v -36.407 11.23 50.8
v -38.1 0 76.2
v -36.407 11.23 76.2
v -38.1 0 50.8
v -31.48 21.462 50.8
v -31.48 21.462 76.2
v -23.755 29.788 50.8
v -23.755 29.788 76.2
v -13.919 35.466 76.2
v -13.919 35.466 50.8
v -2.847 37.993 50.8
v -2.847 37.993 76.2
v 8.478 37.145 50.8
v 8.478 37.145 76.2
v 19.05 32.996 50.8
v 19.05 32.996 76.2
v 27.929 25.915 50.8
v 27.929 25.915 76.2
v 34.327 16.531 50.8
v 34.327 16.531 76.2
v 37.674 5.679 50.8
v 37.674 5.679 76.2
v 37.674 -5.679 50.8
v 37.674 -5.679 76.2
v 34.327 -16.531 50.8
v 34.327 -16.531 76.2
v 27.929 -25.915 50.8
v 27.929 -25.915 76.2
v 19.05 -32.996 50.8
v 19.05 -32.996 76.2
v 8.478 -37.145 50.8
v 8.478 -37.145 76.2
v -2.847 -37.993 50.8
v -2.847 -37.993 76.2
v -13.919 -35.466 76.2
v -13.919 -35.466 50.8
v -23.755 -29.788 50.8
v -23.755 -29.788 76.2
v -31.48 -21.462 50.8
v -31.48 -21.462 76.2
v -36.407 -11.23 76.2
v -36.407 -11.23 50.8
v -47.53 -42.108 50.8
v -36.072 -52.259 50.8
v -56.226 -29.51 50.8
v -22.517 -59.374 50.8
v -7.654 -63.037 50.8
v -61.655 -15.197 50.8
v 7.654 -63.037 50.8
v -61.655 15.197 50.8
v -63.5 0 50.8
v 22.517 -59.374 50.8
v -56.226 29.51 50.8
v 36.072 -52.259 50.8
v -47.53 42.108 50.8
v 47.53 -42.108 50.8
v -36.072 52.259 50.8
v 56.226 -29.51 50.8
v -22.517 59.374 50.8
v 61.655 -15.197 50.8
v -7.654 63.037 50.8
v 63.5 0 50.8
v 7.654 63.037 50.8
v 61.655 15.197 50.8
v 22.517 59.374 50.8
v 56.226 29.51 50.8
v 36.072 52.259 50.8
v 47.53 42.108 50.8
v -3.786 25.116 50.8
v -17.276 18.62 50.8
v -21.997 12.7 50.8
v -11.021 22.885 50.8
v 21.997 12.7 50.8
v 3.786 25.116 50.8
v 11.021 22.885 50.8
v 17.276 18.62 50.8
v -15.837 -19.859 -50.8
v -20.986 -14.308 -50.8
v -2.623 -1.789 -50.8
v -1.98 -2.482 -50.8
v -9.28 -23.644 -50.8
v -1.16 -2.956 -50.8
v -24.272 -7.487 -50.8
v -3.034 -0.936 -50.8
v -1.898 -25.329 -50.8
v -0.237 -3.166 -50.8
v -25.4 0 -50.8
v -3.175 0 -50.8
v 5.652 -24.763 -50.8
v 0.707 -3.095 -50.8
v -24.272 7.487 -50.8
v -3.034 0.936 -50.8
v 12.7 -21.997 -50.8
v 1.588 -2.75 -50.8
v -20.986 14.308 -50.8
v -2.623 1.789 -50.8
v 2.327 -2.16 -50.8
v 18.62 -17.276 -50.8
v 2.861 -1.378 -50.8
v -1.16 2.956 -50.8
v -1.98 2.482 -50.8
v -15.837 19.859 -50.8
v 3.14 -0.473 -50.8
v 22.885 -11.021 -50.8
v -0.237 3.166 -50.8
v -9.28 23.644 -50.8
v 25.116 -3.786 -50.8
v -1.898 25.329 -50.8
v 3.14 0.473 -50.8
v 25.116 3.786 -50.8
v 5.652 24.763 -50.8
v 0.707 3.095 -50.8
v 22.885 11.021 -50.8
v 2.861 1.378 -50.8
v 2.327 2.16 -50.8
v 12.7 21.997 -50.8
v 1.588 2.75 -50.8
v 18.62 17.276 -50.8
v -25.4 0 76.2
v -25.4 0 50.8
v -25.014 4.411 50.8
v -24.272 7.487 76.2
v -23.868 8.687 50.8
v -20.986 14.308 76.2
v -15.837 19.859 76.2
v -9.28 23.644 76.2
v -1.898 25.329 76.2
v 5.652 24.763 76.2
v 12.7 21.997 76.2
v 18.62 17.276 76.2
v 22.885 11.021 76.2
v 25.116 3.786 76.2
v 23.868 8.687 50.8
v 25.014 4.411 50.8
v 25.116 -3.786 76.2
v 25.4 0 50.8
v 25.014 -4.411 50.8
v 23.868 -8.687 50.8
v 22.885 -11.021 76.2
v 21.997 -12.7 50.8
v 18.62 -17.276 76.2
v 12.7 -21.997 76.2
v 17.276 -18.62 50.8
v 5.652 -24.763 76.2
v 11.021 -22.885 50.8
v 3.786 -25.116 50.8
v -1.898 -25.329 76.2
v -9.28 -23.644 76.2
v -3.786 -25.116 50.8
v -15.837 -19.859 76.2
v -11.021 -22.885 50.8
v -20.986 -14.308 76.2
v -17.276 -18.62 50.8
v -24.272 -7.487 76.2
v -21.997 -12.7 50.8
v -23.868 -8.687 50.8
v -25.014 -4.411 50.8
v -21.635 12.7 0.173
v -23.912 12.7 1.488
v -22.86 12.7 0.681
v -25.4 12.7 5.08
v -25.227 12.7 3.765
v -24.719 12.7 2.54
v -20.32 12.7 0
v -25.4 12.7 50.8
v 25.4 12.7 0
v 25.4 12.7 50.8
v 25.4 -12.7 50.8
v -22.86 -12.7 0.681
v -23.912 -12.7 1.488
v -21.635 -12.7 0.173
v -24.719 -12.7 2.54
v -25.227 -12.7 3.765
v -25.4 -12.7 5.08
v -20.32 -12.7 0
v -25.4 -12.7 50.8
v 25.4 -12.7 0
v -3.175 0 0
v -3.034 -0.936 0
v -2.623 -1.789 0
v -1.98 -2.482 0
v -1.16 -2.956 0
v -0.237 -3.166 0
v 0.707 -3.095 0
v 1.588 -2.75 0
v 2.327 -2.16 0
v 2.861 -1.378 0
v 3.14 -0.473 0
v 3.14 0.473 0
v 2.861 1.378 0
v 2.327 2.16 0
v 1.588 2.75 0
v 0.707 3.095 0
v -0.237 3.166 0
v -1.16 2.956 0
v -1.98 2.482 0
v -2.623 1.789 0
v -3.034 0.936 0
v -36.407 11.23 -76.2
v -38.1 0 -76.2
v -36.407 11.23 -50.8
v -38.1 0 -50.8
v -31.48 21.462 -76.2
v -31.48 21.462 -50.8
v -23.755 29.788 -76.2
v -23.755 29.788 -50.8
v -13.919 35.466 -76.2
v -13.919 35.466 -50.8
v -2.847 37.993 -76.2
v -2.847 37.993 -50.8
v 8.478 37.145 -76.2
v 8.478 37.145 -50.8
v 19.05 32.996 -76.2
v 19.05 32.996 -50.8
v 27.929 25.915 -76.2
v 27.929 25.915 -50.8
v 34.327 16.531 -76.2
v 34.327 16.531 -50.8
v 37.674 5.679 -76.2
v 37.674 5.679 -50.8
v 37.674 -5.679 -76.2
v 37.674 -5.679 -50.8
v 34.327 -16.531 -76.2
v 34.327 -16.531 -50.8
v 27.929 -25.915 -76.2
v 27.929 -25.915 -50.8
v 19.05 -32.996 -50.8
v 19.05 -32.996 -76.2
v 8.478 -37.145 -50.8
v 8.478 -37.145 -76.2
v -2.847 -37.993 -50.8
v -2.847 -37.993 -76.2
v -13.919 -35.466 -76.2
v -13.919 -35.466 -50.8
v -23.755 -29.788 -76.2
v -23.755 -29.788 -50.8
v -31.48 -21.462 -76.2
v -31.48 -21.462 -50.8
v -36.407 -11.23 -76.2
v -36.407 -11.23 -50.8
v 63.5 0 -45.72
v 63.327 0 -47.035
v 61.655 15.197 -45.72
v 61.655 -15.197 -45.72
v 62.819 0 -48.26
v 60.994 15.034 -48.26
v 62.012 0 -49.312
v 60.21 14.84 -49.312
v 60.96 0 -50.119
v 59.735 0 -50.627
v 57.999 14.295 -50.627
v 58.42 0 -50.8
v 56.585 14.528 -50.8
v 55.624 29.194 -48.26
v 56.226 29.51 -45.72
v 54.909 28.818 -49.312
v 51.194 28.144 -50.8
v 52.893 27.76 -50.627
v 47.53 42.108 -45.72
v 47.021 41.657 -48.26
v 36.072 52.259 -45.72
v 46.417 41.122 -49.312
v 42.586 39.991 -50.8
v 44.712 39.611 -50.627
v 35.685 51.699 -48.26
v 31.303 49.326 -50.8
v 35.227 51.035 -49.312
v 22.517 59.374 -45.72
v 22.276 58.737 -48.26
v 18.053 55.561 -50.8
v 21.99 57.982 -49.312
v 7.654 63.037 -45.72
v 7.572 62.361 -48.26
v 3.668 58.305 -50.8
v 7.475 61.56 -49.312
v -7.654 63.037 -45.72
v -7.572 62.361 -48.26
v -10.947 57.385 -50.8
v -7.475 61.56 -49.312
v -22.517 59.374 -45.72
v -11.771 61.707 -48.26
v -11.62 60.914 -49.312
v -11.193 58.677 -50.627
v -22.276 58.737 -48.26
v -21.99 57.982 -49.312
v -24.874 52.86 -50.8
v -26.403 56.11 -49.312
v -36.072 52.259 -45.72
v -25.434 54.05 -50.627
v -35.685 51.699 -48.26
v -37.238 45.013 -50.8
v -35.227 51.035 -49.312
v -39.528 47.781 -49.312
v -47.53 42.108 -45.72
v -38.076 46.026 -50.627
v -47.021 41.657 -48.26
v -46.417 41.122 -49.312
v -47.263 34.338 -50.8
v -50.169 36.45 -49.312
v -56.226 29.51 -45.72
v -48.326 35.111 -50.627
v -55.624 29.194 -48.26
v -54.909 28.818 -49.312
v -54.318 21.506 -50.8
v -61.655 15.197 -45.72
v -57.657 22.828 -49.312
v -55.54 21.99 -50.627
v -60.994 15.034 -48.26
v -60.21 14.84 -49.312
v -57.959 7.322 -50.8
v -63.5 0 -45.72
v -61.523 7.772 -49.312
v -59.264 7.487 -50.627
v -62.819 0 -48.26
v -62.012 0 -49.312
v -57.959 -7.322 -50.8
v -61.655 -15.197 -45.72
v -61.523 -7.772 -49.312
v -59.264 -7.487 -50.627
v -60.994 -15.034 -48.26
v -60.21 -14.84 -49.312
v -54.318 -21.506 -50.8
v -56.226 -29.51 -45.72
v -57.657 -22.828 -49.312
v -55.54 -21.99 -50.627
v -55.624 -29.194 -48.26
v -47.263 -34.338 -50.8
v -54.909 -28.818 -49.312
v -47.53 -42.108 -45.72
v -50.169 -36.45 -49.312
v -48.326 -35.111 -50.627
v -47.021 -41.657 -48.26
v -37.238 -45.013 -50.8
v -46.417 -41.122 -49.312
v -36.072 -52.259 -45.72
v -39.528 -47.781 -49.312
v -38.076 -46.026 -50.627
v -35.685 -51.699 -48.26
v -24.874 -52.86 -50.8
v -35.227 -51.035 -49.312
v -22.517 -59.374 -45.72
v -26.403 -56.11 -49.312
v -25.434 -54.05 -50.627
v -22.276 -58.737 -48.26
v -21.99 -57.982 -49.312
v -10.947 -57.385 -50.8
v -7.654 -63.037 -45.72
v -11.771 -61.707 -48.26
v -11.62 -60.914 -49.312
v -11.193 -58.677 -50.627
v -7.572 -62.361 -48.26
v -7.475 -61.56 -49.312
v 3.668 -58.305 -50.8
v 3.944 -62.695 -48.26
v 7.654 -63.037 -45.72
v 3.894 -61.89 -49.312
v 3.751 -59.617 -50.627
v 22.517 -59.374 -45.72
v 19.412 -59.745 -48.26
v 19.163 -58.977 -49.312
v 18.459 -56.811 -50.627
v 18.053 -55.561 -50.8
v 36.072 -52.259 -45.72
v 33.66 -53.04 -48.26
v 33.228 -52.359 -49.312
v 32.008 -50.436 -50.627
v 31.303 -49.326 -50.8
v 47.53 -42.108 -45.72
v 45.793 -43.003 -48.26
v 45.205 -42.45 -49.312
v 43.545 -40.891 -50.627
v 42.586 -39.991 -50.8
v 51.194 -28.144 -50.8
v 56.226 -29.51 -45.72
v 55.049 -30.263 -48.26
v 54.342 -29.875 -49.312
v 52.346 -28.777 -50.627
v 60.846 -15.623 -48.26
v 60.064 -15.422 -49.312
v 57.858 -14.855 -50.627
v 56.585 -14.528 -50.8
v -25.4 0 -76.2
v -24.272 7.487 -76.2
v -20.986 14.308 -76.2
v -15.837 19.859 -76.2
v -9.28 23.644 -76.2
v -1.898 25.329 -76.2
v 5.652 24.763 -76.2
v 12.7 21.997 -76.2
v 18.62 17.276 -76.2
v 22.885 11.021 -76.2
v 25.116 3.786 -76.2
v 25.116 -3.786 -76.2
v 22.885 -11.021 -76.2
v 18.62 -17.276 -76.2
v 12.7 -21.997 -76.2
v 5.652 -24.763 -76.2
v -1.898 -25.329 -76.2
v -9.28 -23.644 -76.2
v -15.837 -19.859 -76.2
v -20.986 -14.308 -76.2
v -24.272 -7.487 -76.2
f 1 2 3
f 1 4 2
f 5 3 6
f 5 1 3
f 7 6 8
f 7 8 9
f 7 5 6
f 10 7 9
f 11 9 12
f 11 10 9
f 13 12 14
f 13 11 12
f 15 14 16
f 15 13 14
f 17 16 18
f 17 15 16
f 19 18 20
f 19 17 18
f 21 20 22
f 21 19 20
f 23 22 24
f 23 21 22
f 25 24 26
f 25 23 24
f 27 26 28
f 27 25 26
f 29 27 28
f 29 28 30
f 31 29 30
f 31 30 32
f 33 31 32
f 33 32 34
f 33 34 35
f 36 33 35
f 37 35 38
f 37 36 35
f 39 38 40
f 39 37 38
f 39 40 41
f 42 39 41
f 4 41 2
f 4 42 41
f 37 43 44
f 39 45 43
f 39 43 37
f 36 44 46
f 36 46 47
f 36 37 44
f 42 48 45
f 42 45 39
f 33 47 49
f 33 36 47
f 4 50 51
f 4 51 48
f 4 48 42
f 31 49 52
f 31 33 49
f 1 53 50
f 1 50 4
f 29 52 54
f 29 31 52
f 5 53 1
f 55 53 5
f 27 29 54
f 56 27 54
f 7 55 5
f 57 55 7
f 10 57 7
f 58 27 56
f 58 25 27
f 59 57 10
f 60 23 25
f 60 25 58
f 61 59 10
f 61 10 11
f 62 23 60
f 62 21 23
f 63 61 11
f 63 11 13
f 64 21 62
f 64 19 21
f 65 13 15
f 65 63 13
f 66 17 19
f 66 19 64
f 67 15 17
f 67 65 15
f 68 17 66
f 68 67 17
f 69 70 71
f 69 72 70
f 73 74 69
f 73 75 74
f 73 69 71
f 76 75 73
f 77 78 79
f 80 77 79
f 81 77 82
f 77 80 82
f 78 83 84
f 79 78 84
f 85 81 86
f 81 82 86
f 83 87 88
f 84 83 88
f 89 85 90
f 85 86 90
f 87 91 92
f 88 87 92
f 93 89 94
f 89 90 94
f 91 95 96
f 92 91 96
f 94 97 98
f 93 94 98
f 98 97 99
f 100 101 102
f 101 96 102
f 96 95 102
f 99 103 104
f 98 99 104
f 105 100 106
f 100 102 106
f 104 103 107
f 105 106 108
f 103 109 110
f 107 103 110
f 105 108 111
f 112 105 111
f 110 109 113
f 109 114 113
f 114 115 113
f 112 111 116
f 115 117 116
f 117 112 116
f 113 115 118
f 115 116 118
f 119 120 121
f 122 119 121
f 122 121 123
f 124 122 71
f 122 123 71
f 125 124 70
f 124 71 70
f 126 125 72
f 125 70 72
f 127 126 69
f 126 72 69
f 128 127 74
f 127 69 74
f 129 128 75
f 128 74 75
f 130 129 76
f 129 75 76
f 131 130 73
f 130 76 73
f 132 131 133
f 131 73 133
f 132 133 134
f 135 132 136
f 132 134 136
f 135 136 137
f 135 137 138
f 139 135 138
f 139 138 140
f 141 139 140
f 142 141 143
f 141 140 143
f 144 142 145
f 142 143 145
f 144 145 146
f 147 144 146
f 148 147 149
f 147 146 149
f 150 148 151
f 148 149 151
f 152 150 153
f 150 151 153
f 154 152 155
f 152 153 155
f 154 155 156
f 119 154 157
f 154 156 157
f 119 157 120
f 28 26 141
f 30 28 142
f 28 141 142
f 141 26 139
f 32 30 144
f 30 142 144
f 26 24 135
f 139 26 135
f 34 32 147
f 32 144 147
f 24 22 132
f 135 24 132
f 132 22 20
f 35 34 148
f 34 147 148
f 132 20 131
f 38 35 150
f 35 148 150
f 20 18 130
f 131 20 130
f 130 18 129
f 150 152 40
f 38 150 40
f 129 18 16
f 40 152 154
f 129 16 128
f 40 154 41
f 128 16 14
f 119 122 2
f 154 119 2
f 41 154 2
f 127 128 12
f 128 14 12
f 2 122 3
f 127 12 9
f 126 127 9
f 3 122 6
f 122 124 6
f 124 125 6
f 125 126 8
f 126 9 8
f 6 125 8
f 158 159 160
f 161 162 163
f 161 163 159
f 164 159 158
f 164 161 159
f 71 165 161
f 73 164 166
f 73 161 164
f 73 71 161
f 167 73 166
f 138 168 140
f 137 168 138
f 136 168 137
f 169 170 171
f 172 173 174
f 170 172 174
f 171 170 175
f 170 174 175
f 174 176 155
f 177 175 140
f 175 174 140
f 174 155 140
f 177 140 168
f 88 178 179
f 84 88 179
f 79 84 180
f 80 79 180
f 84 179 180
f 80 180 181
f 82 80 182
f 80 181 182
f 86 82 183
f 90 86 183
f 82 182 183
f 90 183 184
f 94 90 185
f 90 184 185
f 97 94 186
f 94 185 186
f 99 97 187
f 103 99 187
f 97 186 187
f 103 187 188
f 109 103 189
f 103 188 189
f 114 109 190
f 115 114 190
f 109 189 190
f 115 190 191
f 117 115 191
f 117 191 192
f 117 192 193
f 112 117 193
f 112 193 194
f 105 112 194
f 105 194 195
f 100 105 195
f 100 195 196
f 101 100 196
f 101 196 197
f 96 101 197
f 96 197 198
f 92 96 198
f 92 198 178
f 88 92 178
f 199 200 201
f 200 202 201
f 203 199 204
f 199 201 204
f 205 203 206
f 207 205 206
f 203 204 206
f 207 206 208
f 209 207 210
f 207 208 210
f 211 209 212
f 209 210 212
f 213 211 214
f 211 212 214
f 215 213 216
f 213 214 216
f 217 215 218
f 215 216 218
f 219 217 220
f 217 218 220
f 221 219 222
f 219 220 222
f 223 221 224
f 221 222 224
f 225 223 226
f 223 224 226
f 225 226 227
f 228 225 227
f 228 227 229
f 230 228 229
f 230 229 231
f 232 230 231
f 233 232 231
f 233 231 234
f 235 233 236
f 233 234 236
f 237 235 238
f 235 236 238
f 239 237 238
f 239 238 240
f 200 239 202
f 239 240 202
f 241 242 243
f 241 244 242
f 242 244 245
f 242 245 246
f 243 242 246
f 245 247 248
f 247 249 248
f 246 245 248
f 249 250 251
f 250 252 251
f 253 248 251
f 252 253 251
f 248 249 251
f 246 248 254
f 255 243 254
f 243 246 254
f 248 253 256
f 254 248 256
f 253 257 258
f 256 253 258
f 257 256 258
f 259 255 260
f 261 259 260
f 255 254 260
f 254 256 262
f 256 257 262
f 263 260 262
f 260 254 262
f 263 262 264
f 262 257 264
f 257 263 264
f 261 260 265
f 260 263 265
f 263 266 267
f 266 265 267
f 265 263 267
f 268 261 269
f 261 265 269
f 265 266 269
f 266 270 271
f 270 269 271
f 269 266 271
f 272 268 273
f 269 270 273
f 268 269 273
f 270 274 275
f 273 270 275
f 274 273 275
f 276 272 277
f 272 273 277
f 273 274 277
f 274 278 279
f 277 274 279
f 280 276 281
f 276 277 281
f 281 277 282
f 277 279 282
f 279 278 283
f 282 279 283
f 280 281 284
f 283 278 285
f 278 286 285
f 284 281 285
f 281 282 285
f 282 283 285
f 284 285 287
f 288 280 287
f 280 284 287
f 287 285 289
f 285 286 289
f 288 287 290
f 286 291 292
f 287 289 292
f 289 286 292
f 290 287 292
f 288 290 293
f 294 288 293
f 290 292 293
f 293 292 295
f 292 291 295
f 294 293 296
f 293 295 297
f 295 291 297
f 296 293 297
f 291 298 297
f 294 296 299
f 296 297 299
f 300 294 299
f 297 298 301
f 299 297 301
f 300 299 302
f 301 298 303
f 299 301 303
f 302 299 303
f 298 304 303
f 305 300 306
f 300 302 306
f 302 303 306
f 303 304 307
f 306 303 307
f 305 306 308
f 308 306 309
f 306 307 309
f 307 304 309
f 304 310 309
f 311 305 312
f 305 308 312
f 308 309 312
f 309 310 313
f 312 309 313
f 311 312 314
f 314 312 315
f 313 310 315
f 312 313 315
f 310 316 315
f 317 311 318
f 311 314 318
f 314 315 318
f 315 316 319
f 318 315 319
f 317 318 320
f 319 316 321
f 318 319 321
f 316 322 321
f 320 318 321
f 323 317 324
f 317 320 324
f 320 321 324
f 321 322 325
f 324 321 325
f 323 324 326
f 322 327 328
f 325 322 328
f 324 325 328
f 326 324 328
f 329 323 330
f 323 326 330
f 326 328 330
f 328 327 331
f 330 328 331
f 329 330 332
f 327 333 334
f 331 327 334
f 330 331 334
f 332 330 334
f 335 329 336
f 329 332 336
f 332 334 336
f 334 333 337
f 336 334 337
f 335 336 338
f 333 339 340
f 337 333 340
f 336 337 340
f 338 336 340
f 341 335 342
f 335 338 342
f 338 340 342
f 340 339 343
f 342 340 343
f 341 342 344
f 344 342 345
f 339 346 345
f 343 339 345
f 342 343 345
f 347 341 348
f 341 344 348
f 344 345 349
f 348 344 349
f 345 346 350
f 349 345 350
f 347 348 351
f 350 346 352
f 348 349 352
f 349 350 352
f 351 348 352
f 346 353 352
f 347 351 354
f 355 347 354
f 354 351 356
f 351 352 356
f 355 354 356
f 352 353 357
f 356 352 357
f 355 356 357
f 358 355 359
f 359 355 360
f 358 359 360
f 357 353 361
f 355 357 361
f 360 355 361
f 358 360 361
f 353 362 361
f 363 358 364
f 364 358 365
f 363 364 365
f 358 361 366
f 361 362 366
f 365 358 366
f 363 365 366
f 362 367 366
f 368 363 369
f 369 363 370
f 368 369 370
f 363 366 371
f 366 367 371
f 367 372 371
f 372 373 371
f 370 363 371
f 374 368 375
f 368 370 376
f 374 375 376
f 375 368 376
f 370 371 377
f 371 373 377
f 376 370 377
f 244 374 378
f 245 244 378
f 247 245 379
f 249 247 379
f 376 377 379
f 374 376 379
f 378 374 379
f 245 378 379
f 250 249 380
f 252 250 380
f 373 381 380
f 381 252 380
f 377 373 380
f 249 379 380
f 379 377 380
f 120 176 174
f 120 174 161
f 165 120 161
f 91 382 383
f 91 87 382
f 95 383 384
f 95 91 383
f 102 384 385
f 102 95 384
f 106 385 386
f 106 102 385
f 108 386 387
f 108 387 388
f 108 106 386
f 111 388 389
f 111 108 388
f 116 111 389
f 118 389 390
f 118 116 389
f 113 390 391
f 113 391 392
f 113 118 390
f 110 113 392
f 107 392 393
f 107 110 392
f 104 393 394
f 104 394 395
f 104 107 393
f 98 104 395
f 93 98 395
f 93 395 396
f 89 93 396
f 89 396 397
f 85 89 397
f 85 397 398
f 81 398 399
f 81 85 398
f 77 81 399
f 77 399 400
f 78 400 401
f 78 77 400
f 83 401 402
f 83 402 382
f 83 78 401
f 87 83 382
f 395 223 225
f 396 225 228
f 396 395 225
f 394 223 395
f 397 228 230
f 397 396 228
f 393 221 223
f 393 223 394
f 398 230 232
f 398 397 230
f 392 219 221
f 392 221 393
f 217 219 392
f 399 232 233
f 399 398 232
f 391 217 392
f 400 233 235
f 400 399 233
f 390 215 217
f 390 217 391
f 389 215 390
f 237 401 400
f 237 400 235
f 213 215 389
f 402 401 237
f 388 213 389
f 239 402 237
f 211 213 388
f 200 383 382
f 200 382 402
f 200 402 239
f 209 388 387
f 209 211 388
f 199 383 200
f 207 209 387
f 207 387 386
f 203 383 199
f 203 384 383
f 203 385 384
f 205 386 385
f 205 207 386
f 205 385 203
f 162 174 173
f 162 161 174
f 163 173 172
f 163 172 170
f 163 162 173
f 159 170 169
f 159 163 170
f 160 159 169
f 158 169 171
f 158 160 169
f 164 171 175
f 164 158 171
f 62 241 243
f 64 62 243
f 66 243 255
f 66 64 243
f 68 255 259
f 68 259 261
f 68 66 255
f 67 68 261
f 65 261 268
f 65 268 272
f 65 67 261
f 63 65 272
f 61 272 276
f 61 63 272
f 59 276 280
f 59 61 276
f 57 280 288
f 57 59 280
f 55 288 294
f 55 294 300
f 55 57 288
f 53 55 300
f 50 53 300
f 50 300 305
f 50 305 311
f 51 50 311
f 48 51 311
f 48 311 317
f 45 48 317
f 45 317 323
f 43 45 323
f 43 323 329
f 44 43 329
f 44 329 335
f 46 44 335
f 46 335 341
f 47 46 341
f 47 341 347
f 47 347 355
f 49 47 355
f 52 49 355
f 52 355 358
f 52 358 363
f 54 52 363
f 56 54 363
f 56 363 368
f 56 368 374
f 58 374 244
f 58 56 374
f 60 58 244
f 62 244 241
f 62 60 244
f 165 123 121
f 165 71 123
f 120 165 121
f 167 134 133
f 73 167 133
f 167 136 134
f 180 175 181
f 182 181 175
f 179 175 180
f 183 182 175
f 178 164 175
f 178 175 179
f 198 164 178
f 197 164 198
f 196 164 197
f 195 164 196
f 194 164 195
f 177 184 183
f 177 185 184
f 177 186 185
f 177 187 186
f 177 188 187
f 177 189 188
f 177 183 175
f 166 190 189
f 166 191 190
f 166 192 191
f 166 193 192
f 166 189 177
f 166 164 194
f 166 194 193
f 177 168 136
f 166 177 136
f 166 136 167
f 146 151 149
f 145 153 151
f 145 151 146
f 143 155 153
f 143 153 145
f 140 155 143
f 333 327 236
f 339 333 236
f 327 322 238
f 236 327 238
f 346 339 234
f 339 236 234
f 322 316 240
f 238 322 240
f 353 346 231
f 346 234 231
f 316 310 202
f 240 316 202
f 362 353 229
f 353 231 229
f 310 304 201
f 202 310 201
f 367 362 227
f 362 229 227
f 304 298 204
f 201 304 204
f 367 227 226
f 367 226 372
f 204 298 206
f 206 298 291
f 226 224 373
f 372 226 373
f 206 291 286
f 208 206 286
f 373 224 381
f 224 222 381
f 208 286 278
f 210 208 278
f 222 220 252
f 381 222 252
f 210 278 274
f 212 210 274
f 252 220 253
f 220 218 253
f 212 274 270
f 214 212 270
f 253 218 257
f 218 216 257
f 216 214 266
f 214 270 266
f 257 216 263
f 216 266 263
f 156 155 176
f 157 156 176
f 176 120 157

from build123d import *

# Parameters (mm, degrees)
F0_R     = 63.5
F1_DEPTH = 50.8
F2_W     = 50.8
F2_H     = 25.4
F3_DEPTH = 50.8
F5_D     = 6.35
F6_R     = 5.08
F7_R     = 5.08
F8_W     = 12.7
F8_H     = 25.4


# Not quite as in the source:
# - a pattern or mirror of a feature is missing from the dataset's text; its kind, count and spacing are read off the source's solid


with BuildPart() as f1:
    # F0 (on Top) → F1 (new body, symmetric)
    with BuildSketch(Plane.XY):
        Circle(F0_R)
    extrude(amount=F1_DEPTH, both=True)

    # F2 (on face) → F3 (cut)
    with BuildSketch(Plane.XY.offset(50.8)):
        Rectangle(F2_W, F2_H)
    extrude(amount=-F3_DEPTH, mode=Mode.SUBTRACT)

    # F5 (through all)
    with Locations(Plane(origin=(0, 0, -50.8), x_dir=(1, 0, 0), z_dir=(0, 0, -1))):
        with Locations((0, 0)):
            Hole(F5_D / 2)

    # F6
    f6_edges = [f1.edges().sort_by_distance(p)[0] for p in [
        (-63.5, 0, -50.8),
    ]]
    fillet(f6_edges, radius=F6_R)

    # F7
    f7_edges = [f1.edges().sort_by_distance(p)[0] for p in [
        (-25.4, 0, 0),
    ]]
    fillet(f7_edges, radius=F7_R)

    # F8 (on Front) → F9 (revolve)
    with BuildSketch(Plane.XZ):
        with Locations((-31.75, -63.5)):
            Rectangle(F8_W, F8_H)
    f9 = revolve(axis=Axis((0, 0, 19.3926589563), (0, 0, -1)))

    # F9_copies: F9 across plane
    add(f9.mirror(Plane.XY))


solid = f1.part
